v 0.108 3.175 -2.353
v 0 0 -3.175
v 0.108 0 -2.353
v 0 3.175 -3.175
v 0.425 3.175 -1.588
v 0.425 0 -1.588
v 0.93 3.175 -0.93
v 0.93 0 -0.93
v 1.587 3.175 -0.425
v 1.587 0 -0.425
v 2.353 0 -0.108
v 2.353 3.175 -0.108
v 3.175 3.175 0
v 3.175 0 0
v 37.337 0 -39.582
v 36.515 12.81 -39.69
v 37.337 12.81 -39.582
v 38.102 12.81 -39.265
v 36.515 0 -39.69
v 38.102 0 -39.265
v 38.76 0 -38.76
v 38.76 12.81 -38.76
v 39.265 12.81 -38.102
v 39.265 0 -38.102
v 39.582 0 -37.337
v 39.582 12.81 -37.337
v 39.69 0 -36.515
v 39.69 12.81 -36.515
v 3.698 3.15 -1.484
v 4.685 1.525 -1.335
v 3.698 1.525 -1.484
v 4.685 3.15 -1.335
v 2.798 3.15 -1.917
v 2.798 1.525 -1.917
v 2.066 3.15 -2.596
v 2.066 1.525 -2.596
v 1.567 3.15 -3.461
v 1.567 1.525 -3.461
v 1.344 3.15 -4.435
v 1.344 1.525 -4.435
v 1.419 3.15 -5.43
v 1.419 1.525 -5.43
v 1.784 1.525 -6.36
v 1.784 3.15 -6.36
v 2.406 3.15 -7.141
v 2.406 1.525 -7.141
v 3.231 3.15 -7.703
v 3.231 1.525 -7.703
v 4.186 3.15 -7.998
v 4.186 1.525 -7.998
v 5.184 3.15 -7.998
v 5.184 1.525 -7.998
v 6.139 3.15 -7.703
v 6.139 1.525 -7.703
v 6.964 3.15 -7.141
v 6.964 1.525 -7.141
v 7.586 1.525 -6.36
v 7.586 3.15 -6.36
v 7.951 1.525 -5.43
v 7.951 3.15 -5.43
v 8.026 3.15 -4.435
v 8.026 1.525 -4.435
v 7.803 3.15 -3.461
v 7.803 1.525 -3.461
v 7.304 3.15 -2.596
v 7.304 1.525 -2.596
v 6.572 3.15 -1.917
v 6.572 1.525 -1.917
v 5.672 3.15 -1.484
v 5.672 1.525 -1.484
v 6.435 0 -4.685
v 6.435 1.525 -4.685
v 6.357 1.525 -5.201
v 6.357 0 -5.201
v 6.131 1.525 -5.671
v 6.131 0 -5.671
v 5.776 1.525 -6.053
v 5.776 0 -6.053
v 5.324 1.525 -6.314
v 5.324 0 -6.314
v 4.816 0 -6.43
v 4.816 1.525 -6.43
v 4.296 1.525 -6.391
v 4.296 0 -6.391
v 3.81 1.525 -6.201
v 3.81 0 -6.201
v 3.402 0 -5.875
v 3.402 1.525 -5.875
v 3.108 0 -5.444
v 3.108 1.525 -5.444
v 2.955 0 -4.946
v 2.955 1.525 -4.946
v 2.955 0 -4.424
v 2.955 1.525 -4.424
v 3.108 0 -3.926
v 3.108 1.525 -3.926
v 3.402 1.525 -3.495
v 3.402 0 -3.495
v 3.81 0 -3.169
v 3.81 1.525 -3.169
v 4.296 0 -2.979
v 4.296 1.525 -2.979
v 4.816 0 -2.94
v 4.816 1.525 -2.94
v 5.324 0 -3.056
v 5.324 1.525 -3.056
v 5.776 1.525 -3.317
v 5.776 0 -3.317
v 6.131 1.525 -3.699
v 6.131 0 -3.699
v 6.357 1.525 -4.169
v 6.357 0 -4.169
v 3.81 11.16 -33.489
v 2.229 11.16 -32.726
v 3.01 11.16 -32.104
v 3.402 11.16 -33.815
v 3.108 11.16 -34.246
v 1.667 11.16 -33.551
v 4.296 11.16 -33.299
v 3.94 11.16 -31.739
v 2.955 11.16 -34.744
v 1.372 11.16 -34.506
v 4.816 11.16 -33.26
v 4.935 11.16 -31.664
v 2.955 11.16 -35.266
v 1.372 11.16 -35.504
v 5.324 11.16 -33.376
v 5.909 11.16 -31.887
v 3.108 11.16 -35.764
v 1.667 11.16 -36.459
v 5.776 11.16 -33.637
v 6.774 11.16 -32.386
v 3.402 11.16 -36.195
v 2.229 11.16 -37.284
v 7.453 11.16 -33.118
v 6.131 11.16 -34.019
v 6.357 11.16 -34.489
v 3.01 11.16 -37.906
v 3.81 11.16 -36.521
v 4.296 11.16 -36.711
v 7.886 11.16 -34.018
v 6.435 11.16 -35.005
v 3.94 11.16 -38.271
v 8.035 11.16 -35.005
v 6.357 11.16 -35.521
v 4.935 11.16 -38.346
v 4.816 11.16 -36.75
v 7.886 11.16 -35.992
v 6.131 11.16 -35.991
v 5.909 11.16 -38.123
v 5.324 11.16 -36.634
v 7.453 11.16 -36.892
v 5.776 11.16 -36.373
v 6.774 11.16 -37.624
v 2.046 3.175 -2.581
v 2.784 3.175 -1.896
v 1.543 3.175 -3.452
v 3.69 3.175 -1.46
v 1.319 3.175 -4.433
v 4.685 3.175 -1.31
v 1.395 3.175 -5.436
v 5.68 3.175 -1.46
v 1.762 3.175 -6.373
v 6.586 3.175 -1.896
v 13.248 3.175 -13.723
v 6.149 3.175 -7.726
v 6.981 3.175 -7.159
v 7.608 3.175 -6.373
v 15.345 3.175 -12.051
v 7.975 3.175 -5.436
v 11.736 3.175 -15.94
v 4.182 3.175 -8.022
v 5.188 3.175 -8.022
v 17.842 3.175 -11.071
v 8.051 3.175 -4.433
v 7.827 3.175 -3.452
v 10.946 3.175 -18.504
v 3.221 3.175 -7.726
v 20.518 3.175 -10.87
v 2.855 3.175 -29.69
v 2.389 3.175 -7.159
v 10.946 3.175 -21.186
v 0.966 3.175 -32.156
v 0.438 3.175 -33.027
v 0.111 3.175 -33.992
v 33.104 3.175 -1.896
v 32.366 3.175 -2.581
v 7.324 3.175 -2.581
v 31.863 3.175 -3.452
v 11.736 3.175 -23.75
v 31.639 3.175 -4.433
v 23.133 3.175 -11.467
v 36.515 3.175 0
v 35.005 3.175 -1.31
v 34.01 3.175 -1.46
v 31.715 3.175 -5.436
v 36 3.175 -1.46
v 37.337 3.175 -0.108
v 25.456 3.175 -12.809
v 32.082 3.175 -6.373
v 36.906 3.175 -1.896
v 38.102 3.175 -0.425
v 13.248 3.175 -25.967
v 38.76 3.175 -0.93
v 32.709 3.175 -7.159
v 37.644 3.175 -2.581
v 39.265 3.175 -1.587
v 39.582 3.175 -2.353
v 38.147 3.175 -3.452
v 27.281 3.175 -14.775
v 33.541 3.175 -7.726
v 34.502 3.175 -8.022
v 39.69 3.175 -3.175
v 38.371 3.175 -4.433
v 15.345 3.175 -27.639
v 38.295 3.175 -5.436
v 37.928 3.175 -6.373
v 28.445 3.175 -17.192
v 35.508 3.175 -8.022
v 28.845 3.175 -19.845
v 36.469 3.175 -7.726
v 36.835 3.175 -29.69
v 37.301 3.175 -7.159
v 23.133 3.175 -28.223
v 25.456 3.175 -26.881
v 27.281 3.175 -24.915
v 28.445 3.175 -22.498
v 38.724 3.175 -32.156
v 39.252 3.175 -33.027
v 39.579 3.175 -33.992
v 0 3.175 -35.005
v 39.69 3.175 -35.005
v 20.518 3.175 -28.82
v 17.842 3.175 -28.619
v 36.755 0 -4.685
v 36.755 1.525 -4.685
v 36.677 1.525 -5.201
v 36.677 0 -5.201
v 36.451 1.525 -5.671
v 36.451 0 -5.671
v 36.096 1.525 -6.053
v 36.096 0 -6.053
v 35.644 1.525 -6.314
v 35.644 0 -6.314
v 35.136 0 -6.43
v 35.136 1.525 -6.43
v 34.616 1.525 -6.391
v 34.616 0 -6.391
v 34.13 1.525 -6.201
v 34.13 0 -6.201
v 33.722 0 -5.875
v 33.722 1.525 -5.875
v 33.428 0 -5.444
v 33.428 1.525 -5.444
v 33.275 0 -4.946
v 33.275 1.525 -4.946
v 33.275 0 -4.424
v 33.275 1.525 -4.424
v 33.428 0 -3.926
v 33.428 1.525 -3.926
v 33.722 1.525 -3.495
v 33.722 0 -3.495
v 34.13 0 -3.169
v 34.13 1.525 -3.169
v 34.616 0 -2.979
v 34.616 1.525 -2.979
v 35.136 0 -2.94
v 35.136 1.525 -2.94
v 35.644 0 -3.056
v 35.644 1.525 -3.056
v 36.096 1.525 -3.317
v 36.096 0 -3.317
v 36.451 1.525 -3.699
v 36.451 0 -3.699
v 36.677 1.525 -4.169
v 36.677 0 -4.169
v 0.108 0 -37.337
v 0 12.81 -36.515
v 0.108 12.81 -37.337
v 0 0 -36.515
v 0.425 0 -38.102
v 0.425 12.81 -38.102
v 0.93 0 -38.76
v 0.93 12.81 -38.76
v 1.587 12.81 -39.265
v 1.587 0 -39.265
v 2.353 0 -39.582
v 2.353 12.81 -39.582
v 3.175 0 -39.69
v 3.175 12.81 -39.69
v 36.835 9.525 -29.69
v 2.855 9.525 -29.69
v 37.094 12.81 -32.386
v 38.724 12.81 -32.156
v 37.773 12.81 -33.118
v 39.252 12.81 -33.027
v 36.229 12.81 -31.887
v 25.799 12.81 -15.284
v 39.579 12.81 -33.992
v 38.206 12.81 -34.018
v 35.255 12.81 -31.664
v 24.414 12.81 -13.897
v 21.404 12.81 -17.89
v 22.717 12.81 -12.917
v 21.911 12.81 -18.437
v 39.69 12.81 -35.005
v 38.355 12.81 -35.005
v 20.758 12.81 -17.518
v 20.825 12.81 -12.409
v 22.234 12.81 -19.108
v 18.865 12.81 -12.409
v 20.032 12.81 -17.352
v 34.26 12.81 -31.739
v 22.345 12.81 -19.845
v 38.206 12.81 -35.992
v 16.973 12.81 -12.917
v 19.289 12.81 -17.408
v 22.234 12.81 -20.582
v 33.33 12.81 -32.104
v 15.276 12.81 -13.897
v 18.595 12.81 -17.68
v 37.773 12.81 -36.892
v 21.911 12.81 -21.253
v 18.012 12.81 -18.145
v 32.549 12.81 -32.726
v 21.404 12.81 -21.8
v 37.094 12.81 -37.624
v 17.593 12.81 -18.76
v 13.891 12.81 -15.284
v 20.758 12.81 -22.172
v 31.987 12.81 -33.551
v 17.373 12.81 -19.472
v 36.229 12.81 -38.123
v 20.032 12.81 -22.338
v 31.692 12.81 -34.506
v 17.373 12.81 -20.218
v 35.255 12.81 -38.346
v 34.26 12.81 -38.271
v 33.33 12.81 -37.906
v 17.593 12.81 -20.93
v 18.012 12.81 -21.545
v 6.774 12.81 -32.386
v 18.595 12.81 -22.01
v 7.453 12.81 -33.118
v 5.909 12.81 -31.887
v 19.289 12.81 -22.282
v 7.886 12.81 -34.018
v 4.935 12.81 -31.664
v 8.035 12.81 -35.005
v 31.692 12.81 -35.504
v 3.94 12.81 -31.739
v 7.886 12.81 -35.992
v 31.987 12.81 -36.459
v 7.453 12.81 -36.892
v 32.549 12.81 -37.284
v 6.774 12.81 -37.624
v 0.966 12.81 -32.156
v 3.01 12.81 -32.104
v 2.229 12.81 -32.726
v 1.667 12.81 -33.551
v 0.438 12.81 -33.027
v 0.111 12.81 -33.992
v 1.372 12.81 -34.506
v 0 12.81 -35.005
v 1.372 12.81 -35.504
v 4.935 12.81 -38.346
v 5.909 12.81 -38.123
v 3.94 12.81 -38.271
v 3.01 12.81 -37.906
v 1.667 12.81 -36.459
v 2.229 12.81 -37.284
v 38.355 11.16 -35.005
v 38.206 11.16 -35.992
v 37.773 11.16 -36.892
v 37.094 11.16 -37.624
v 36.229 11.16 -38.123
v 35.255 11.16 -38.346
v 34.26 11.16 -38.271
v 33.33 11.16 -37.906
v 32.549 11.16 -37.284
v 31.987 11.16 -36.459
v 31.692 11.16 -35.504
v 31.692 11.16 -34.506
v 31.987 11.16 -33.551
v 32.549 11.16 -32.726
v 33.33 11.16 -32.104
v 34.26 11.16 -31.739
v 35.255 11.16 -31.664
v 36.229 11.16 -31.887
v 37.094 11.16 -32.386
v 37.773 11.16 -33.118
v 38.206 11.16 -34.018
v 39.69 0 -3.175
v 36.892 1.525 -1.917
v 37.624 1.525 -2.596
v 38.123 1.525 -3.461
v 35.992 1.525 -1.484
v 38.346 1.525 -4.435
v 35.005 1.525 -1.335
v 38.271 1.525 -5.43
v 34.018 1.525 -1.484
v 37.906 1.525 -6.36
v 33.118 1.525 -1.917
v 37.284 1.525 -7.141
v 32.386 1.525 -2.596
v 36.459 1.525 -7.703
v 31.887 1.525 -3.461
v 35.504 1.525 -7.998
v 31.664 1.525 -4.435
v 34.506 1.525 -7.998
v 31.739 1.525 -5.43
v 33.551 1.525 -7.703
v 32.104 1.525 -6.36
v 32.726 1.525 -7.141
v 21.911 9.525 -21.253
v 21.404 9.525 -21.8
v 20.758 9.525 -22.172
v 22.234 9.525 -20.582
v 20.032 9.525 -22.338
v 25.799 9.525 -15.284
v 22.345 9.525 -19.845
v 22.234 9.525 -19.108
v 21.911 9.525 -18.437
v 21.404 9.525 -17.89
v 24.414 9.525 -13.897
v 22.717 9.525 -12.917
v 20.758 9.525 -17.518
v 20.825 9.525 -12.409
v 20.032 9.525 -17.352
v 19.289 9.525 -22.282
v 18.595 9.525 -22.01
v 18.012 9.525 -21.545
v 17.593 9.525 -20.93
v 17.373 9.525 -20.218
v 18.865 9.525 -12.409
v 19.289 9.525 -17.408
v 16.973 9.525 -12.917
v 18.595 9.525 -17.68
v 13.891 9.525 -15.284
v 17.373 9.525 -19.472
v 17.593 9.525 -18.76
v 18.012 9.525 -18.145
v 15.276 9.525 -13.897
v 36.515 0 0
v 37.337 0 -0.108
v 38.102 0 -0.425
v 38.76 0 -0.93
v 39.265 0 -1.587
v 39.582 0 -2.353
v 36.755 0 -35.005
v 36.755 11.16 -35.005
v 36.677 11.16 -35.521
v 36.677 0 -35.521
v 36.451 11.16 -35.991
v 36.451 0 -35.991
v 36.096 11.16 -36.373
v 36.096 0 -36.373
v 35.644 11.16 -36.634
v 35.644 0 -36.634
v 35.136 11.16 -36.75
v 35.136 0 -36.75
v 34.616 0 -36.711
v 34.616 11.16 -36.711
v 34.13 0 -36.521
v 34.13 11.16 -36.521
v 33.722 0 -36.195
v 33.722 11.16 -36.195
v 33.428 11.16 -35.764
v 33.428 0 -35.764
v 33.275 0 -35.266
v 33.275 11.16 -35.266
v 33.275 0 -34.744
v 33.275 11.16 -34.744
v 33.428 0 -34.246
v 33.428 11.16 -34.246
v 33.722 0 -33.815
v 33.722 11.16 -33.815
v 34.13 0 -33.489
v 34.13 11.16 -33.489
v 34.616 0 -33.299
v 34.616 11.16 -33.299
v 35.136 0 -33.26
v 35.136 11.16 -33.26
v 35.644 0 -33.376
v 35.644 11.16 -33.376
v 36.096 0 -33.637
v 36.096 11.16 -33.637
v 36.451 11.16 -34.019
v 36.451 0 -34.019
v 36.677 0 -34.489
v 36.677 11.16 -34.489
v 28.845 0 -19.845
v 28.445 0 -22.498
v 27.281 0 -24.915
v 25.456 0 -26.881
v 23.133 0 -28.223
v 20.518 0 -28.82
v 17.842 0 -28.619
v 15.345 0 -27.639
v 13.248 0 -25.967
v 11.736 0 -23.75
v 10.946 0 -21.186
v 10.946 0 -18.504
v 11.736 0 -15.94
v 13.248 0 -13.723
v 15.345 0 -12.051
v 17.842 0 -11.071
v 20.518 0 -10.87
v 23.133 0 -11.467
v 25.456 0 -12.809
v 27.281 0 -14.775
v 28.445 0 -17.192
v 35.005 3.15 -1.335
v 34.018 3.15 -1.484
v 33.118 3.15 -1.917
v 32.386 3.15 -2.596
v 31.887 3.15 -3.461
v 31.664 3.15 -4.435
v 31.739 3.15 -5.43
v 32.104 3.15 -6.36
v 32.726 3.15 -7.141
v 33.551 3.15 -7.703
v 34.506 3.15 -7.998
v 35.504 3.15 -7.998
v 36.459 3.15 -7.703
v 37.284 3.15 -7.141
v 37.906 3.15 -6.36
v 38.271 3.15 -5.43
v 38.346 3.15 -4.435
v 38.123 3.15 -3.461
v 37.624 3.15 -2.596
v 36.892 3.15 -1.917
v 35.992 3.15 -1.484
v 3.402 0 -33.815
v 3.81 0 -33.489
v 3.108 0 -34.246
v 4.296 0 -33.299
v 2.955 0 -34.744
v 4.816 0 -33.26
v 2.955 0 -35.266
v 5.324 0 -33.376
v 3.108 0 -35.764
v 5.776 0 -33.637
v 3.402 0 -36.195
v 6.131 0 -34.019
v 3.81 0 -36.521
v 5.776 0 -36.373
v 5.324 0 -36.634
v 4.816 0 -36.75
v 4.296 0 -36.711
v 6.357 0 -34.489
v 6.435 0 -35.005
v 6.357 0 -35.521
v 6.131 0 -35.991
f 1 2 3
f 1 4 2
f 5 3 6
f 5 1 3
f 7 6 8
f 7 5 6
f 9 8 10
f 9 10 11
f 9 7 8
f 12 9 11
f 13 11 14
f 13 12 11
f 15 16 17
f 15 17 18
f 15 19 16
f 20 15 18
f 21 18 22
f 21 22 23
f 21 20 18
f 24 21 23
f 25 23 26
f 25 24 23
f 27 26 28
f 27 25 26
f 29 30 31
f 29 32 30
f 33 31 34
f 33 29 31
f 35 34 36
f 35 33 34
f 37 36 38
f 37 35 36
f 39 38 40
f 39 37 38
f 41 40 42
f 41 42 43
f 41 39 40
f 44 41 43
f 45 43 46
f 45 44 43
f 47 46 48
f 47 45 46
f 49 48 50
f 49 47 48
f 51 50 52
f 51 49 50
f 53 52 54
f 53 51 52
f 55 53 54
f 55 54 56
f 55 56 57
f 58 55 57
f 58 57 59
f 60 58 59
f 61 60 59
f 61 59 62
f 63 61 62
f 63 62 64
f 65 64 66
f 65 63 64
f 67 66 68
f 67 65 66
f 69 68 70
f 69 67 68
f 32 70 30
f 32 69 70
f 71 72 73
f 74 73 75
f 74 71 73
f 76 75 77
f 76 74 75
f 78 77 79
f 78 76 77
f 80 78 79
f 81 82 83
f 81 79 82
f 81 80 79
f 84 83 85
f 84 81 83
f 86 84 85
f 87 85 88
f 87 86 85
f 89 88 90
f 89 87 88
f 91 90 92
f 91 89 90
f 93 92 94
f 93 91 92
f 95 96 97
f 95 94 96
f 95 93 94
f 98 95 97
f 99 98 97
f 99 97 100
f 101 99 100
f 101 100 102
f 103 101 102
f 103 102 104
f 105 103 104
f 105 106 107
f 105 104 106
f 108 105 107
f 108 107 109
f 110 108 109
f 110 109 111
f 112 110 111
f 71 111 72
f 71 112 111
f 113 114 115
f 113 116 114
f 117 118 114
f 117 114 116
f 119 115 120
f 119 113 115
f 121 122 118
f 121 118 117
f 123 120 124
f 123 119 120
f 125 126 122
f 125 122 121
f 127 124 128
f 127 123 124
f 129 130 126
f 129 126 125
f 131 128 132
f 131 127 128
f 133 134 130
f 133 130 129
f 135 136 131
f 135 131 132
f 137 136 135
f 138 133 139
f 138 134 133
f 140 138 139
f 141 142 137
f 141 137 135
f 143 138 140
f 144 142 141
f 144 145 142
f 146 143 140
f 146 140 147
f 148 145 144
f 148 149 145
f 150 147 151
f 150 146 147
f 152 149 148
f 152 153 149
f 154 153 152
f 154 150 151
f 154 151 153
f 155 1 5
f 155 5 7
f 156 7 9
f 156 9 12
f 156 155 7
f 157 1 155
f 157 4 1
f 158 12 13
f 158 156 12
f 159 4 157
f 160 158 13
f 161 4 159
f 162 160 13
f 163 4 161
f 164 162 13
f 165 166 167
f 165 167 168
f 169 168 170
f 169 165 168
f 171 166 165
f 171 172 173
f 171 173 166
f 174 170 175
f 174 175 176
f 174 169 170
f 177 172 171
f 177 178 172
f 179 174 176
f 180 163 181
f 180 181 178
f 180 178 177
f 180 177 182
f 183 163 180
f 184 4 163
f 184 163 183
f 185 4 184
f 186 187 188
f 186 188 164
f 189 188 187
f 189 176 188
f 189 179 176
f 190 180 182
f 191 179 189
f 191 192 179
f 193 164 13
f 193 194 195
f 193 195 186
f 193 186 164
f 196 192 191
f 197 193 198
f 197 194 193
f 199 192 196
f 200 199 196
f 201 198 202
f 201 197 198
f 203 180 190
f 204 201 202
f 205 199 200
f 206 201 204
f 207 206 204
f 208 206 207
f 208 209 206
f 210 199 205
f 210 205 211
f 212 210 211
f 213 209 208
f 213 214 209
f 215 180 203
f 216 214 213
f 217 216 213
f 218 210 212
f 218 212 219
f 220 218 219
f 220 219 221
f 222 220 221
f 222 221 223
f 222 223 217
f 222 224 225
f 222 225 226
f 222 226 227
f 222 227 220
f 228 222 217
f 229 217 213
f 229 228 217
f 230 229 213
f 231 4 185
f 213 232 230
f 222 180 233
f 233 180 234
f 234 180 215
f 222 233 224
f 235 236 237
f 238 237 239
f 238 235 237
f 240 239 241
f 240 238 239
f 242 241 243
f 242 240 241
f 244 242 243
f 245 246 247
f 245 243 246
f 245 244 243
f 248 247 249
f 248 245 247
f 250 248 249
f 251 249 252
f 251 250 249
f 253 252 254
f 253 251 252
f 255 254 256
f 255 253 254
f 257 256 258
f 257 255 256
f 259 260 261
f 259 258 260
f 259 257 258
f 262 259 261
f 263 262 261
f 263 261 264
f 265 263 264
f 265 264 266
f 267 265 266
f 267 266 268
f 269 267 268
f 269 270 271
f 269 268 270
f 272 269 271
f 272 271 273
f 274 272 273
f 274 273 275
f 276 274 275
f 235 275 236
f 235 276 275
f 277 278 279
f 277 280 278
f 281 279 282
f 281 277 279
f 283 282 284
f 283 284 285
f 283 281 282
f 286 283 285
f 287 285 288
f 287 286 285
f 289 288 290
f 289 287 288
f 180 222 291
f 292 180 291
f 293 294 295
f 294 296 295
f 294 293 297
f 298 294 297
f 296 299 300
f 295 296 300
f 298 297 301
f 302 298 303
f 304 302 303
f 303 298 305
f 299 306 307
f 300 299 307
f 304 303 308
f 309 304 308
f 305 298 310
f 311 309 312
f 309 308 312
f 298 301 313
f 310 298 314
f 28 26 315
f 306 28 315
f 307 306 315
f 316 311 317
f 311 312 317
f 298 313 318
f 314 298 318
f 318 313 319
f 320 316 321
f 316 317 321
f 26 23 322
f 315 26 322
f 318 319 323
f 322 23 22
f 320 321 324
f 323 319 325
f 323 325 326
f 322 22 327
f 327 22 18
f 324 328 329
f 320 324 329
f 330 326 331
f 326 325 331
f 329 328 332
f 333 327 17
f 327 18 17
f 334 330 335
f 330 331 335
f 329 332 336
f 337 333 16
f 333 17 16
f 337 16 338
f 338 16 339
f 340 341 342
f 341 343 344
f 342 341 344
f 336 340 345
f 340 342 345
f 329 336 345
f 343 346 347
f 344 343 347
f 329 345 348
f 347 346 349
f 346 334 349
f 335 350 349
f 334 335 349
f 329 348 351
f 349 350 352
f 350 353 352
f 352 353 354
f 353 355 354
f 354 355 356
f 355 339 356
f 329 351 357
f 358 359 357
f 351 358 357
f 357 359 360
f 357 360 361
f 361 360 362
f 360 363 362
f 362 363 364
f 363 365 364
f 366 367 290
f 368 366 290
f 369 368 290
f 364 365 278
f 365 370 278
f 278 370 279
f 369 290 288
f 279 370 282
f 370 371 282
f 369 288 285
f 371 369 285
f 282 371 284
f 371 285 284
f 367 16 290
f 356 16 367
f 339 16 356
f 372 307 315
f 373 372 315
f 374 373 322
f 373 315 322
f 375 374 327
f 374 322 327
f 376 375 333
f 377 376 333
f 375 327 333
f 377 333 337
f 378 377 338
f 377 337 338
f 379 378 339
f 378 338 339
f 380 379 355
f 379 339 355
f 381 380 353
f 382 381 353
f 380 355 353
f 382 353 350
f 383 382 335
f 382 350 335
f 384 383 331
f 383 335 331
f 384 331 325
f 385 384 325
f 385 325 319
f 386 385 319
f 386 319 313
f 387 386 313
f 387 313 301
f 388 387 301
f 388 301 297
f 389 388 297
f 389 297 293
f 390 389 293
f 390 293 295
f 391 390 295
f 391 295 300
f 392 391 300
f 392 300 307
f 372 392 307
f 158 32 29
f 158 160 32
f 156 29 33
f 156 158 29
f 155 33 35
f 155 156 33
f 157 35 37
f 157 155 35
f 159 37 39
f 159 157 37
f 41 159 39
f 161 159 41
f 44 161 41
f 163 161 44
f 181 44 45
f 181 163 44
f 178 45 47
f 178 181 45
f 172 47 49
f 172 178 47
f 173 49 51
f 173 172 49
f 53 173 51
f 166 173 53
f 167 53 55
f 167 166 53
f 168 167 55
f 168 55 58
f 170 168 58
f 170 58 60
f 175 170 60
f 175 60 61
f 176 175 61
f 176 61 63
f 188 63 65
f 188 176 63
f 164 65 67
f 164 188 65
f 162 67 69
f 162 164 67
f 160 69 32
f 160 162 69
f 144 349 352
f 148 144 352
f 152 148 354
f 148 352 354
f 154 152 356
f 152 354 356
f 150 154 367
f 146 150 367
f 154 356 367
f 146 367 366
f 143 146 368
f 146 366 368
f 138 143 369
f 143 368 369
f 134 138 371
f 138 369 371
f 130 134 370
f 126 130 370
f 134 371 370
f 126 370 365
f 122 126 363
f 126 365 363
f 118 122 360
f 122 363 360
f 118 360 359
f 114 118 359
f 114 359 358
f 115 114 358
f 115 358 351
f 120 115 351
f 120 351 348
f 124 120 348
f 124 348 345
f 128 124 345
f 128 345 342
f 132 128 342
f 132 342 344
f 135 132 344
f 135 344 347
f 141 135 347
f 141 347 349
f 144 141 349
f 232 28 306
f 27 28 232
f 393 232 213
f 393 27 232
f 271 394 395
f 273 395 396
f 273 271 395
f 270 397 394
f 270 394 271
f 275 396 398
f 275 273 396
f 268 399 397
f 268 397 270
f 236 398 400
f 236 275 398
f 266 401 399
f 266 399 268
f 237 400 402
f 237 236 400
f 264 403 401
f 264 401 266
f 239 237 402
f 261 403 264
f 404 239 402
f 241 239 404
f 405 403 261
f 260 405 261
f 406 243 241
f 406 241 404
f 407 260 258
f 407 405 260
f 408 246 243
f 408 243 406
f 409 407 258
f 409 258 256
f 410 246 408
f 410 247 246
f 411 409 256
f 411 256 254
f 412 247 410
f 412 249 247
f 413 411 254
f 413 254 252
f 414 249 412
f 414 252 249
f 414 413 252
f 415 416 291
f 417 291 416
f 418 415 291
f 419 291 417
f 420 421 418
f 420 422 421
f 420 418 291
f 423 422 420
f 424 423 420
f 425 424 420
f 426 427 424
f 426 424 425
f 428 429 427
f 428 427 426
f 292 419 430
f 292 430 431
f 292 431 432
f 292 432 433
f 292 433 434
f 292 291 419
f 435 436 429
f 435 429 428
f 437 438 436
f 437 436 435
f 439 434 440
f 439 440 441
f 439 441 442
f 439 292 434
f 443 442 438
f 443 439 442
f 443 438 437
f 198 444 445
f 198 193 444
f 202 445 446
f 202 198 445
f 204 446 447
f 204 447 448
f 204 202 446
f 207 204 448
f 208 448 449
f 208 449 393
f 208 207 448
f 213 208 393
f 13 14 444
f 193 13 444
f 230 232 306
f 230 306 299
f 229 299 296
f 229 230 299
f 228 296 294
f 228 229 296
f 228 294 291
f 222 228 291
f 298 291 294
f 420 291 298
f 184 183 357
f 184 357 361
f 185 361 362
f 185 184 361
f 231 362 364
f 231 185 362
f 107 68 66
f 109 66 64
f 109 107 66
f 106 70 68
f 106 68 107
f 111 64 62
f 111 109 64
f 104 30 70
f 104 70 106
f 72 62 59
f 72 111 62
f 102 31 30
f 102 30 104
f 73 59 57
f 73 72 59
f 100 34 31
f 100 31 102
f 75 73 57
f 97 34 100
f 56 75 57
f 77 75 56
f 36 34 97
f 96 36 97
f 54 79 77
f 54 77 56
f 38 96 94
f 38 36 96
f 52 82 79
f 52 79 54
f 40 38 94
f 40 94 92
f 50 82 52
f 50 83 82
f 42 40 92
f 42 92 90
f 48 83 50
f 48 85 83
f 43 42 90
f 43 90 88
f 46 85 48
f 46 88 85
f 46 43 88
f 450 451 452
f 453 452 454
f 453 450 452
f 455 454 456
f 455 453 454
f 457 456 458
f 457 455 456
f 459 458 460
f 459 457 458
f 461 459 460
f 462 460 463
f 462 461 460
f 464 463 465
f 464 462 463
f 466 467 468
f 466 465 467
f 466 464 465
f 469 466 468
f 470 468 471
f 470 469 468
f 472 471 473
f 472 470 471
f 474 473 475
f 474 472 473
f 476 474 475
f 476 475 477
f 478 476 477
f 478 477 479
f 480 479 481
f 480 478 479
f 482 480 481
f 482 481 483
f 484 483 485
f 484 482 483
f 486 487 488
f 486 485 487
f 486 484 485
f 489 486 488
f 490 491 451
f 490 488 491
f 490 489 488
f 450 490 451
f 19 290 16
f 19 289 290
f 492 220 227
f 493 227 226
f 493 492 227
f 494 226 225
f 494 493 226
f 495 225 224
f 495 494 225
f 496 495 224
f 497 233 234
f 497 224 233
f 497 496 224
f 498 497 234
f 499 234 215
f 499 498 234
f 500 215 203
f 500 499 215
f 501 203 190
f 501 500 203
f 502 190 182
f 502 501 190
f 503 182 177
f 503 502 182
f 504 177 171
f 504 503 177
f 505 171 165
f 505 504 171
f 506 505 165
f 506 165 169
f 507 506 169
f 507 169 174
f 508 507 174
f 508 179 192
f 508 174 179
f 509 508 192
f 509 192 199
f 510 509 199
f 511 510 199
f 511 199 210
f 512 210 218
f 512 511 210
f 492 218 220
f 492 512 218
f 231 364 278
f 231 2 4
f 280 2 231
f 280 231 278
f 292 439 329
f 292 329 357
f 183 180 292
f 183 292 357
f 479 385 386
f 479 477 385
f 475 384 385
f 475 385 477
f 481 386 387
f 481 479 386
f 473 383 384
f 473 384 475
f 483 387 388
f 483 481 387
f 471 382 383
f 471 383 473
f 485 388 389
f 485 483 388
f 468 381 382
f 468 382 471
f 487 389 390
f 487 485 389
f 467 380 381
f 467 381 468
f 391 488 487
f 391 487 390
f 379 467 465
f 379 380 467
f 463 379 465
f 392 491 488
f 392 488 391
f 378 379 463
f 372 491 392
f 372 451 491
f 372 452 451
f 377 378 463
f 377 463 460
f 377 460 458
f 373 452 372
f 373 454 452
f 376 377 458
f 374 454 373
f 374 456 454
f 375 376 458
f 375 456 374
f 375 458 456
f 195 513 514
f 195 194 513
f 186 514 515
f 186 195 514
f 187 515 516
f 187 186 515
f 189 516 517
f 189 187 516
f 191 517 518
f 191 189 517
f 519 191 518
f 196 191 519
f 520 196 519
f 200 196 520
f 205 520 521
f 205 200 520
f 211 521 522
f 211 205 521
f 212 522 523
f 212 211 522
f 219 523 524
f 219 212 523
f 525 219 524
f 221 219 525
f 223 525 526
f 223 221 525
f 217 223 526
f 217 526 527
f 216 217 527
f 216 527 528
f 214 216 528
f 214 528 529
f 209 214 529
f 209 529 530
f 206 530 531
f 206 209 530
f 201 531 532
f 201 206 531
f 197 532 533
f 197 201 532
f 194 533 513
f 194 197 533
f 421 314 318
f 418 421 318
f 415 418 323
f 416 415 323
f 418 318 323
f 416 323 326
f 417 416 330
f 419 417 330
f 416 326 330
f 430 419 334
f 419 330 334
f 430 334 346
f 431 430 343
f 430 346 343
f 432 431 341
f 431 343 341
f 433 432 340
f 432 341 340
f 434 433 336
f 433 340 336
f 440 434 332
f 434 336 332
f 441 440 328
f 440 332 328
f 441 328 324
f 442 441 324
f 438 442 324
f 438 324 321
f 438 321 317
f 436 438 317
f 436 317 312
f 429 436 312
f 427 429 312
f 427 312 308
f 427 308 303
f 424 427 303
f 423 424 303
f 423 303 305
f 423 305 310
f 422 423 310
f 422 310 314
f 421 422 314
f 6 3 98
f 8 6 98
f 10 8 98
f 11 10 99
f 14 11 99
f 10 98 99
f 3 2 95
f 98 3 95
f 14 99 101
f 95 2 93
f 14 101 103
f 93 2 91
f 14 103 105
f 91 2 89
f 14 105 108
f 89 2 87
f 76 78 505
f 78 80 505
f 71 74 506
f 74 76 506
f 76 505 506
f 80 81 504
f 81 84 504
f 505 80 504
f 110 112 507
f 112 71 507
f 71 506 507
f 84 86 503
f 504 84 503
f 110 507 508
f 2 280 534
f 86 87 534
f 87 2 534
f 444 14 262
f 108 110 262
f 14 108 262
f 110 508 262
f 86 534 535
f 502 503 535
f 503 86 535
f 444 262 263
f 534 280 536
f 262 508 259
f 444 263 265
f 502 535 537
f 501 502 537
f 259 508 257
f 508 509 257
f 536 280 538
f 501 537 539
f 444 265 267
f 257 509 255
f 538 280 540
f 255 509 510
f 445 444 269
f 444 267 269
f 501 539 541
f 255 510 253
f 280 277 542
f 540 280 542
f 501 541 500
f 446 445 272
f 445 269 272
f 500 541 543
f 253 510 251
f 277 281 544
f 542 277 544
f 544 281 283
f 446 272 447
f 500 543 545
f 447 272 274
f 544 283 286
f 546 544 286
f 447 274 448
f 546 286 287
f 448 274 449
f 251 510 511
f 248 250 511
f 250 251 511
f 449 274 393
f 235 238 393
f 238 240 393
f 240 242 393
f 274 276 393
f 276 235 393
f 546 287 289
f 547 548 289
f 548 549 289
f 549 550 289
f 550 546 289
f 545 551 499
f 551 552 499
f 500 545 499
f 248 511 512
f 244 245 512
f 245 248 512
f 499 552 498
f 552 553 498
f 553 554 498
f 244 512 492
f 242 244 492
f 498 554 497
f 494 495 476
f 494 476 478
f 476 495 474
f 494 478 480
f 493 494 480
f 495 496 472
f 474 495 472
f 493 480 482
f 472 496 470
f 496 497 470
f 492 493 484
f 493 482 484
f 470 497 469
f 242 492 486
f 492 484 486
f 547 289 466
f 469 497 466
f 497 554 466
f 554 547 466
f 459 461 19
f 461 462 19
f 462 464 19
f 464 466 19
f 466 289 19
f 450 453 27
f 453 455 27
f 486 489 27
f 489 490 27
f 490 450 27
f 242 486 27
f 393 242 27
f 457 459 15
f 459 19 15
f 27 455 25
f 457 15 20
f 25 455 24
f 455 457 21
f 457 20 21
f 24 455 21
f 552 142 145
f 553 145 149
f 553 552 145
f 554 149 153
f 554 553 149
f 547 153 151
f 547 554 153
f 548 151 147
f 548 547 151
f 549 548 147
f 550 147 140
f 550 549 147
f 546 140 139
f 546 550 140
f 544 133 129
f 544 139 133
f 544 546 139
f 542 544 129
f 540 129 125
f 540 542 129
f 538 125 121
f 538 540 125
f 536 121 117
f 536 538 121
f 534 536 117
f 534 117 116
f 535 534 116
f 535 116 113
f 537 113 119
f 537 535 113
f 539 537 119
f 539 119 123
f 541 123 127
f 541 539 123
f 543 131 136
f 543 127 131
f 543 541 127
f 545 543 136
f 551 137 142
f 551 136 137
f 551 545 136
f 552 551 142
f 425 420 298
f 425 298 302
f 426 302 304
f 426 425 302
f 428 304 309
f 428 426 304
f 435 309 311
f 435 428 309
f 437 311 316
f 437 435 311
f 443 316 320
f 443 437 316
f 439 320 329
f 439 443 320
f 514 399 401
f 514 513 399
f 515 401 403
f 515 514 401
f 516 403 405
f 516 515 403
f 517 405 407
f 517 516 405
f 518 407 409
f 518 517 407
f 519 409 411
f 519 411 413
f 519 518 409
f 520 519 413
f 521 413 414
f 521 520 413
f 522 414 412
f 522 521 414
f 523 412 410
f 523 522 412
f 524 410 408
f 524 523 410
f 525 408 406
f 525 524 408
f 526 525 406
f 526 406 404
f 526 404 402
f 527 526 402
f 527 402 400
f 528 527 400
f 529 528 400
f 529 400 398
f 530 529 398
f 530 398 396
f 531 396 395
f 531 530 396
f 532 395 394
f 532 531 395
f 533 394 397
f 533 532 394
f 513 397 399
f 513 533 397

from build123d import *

# Parameters (mm, degrees)
SKETCH1_W                       = 39.69
SKETCH1_H                       = 39.69
SKETCH1_R                       = 1.75
SKETCH1_R_2                     = 9
BOSS_EXTRUDE1_DEPTH             = 3.175
SKETCH2_R                       = 1.75
BOSS_EXTRUDE2_DEPTH             = 9.635
SKETCH3_W                       = 29.69
SKETCH3_H                       = 6.35
CUT_EXTRUDE1_DEPTH              = 40.69
CBORE_FOR_M3_SBHCS1_D           = 3.4
CBORE_FOR_M3_SBHCS1_DEPTH       = 14.3
CBORE_FOR_M3_SBHCS1_CBORE_D     = 6.7
CBORE_FOR_M3_SBHCS1_CBORE_DEPTH = 1.65
CBORE_FOR_M3_SBHCS1_TIP         = 1.021463052
CBORE_FOR_M3_SBHCS2_AT_2_COUNT  = 2
CBORE_FOR_M3_SBHCS2_AT_2_PITCH  = 30.32
FILLET1_R                       = 3.175
CUT_EXTRUDE2_REACH              = 14.81
SKETCH8_R                       = 2.5


with BuildPart() as part:
    # Sketch1 → Boss-Extrude1 (new body)
    with BuildSketch(Plane(origin=(0, 0, 0), x_dir=(1, 0, 0), z_dir=(0, 1, 0))):
        with Locations((19.845, 19.845)):
            Rectangle(SKETCH1_W, SKETCH1_H)
        with Locations((4.685, 4.685)):
            Circle(SKETCH1_R, mode=Mode.SUBTRACT)
        with Locations((35.005, 4.685)):
            Circle(SKETCH1_R, mode=Mode.SUBTRACT)
        with Locations((35.005, 35.005)):
            Circle(SKETCH1_R, mode=Mode.SUBTRACT)
        with Locations((4.685, 35.005)):
            Circle(SKETCH1_R, mode=Mode.SUBTRACT)
        with Locations((19.845, 19.845)):
            Circle(SKETCH1_R_2, mode=Mode.SUBTRACT)
    extrude(amount=BOSS_EXTRUDE1_DEPTH)

    # Sketch2 → Boss-Extrude2 (add)
    with BuildSketch(Plane(origin=(0, 3.175, 0), x_dir=(1, 0, 0), z_dir=(0, 1, 0))):
        with BuildLine():
            Line((0, 35.005), (0, 39.69))
            Line((0, 39.69), (4.685, 39.69))
            Line((4.685, 39.69), (35.005, 39.69))
            Line((35.005, 39.69), (39.69, 39.69))
            Line((39.69, 39.69), (39.69, 35.005))
            ThreePointArc((39.69, 35.005), (39.441954912, 33.500787212), (38.724084904, 32.15585408))
            Line((38.724084904, 32.15585408), (25.79871116, 15.283933959))
            ThreePointArc((25.79871116, 15.283933959), (19.845, 12.345), (13.89128884, 15.283933959))
            Line((13.89128884, 15.283933959), (0.965915096, 32.15585408))
            ThreePointArc((0.965915096, 32.15585408), (0.248045088, 33.500787212), (0, 35.005))
        make_face()
        with Locations((35.005, 35.005)):
            Circle(SKETCH2_R, mode=Mode.SUBTRACT)
        with Locations((4.685, 35.005)):
            Circle(SKETCH2_R, mode=Mode.SUBTRACT)
    extrude(amount=BOSS_EXTRUDE2_DEPTH)

    # Sketch3 → Cut-Extrude1 (cut, through all)
    with BuildSketch(Plane.ZY):
        with Locations((-14.845, 6.35)):
            Rectangle(SKETCH3_W, SKETCH3_H)
    extrude(amount=-CUT_EXTRUDE1_DEPTH, mode=Mode.SUBTRACT)

    # CBORE for M3 SBHCS1
    with Locations(Plane(origin=(0, 12.81, 0), x_dir=(1, 0, 0), z_dir=(0, 1, 0))):
        with Locations((4.685, 35.005), (35.005, 35.005)):
            CounterBoreHole(CBORE_FOR_M3_SBHCS1_D / 2, CBORE_FOR_M3_SBHCS1_CBORE_D / 2, CBORE_FOR_M3_SBHCS1_CBORE_DEPTH, depth=CBORE_FOR_M3_SBHCS1_DEPTH)
            with Locations((0, 0, -(CBORE_FOR_M3_SBHCS1_DEPTH + CBORE_FOR_M3_SBHCS1_TIP / 2))):  # 118° drill point
                Cone(0, CBORE_FOR_M3_SBHCS1_D / 2, CBORE_FOR_M3_SBHCS1_TIP, mode=Mode.SUBTRACT)

    # Sketch7 → CBORE for M3 SBHCS2 (revolve, cut)
    with BuildSketch(Plane(origin=(4.685, 3.175, -4.685), x_dir=(0, 0, 1), z_dir=(1, 0, 0))):
        Polygon((0, 0), (0, 15.321463052), (1.7, 14.3), (1.7, 1.65), (3.35, 1.65), (3.35, 0.025), (3.375, 0), align=None)
    cbore_for_m3_sbhcs2 = revolve(axis=Axis((4.685, 9.525, -4.685), (0, -1, 0)), mode=Mode.SUBTRACT)

    # CBORE for M3 SBHCS2 at 2: CBORE for M3 SBHCS2 ×2
    with Locations(*[(i * CBORE_FOR_M3_SBHCS2_AT_2_PITCH, 0, 0) for i in range(1, CBORE_FOR_M3_SBHCS2_AT_2_COUNT)]):
        add(cbore_for_m3_sbhcs2, mode=Mode.SUBTRACT)

    # Fillet1
    fillet1_edges = [part.edges().sort_by_distance(p)[0] for p in [
        (0, 6.405, -39.69),
        (39.69, 6.405, -39.69),
        (39.69, 1.5875, 0),
        (0, 1.5875, 0),
    ]]
    fillet(fillet1_edges, radius=FILLET1_R)

    # Sketch8 → Cut-Extrude2 (cut, up to next)
    with BuildSketch(Plane(origin=(0, 12.81, 0), x_dir=(1, 0, 0), z_dir=(0, 1, 0)), mode=Mode.PRIVATE) as cut_extrude2_sk1:
        with Locations((19.845, 19.845)):
            Circle(SKETCH8_R)
    cut_extrude2_tool1 = extrude(cut_extrude2_sk1.sketch, amount=-CUT_EXTRUDE2_REACH, mode=Mode.PRIVATE) & part.part
    add(cut_extrude2_tool1.solids().sort_by_distance((19.845, 12.81, -19.845))[0], mode=Mode.SUBTRACT)


solid = part.part
